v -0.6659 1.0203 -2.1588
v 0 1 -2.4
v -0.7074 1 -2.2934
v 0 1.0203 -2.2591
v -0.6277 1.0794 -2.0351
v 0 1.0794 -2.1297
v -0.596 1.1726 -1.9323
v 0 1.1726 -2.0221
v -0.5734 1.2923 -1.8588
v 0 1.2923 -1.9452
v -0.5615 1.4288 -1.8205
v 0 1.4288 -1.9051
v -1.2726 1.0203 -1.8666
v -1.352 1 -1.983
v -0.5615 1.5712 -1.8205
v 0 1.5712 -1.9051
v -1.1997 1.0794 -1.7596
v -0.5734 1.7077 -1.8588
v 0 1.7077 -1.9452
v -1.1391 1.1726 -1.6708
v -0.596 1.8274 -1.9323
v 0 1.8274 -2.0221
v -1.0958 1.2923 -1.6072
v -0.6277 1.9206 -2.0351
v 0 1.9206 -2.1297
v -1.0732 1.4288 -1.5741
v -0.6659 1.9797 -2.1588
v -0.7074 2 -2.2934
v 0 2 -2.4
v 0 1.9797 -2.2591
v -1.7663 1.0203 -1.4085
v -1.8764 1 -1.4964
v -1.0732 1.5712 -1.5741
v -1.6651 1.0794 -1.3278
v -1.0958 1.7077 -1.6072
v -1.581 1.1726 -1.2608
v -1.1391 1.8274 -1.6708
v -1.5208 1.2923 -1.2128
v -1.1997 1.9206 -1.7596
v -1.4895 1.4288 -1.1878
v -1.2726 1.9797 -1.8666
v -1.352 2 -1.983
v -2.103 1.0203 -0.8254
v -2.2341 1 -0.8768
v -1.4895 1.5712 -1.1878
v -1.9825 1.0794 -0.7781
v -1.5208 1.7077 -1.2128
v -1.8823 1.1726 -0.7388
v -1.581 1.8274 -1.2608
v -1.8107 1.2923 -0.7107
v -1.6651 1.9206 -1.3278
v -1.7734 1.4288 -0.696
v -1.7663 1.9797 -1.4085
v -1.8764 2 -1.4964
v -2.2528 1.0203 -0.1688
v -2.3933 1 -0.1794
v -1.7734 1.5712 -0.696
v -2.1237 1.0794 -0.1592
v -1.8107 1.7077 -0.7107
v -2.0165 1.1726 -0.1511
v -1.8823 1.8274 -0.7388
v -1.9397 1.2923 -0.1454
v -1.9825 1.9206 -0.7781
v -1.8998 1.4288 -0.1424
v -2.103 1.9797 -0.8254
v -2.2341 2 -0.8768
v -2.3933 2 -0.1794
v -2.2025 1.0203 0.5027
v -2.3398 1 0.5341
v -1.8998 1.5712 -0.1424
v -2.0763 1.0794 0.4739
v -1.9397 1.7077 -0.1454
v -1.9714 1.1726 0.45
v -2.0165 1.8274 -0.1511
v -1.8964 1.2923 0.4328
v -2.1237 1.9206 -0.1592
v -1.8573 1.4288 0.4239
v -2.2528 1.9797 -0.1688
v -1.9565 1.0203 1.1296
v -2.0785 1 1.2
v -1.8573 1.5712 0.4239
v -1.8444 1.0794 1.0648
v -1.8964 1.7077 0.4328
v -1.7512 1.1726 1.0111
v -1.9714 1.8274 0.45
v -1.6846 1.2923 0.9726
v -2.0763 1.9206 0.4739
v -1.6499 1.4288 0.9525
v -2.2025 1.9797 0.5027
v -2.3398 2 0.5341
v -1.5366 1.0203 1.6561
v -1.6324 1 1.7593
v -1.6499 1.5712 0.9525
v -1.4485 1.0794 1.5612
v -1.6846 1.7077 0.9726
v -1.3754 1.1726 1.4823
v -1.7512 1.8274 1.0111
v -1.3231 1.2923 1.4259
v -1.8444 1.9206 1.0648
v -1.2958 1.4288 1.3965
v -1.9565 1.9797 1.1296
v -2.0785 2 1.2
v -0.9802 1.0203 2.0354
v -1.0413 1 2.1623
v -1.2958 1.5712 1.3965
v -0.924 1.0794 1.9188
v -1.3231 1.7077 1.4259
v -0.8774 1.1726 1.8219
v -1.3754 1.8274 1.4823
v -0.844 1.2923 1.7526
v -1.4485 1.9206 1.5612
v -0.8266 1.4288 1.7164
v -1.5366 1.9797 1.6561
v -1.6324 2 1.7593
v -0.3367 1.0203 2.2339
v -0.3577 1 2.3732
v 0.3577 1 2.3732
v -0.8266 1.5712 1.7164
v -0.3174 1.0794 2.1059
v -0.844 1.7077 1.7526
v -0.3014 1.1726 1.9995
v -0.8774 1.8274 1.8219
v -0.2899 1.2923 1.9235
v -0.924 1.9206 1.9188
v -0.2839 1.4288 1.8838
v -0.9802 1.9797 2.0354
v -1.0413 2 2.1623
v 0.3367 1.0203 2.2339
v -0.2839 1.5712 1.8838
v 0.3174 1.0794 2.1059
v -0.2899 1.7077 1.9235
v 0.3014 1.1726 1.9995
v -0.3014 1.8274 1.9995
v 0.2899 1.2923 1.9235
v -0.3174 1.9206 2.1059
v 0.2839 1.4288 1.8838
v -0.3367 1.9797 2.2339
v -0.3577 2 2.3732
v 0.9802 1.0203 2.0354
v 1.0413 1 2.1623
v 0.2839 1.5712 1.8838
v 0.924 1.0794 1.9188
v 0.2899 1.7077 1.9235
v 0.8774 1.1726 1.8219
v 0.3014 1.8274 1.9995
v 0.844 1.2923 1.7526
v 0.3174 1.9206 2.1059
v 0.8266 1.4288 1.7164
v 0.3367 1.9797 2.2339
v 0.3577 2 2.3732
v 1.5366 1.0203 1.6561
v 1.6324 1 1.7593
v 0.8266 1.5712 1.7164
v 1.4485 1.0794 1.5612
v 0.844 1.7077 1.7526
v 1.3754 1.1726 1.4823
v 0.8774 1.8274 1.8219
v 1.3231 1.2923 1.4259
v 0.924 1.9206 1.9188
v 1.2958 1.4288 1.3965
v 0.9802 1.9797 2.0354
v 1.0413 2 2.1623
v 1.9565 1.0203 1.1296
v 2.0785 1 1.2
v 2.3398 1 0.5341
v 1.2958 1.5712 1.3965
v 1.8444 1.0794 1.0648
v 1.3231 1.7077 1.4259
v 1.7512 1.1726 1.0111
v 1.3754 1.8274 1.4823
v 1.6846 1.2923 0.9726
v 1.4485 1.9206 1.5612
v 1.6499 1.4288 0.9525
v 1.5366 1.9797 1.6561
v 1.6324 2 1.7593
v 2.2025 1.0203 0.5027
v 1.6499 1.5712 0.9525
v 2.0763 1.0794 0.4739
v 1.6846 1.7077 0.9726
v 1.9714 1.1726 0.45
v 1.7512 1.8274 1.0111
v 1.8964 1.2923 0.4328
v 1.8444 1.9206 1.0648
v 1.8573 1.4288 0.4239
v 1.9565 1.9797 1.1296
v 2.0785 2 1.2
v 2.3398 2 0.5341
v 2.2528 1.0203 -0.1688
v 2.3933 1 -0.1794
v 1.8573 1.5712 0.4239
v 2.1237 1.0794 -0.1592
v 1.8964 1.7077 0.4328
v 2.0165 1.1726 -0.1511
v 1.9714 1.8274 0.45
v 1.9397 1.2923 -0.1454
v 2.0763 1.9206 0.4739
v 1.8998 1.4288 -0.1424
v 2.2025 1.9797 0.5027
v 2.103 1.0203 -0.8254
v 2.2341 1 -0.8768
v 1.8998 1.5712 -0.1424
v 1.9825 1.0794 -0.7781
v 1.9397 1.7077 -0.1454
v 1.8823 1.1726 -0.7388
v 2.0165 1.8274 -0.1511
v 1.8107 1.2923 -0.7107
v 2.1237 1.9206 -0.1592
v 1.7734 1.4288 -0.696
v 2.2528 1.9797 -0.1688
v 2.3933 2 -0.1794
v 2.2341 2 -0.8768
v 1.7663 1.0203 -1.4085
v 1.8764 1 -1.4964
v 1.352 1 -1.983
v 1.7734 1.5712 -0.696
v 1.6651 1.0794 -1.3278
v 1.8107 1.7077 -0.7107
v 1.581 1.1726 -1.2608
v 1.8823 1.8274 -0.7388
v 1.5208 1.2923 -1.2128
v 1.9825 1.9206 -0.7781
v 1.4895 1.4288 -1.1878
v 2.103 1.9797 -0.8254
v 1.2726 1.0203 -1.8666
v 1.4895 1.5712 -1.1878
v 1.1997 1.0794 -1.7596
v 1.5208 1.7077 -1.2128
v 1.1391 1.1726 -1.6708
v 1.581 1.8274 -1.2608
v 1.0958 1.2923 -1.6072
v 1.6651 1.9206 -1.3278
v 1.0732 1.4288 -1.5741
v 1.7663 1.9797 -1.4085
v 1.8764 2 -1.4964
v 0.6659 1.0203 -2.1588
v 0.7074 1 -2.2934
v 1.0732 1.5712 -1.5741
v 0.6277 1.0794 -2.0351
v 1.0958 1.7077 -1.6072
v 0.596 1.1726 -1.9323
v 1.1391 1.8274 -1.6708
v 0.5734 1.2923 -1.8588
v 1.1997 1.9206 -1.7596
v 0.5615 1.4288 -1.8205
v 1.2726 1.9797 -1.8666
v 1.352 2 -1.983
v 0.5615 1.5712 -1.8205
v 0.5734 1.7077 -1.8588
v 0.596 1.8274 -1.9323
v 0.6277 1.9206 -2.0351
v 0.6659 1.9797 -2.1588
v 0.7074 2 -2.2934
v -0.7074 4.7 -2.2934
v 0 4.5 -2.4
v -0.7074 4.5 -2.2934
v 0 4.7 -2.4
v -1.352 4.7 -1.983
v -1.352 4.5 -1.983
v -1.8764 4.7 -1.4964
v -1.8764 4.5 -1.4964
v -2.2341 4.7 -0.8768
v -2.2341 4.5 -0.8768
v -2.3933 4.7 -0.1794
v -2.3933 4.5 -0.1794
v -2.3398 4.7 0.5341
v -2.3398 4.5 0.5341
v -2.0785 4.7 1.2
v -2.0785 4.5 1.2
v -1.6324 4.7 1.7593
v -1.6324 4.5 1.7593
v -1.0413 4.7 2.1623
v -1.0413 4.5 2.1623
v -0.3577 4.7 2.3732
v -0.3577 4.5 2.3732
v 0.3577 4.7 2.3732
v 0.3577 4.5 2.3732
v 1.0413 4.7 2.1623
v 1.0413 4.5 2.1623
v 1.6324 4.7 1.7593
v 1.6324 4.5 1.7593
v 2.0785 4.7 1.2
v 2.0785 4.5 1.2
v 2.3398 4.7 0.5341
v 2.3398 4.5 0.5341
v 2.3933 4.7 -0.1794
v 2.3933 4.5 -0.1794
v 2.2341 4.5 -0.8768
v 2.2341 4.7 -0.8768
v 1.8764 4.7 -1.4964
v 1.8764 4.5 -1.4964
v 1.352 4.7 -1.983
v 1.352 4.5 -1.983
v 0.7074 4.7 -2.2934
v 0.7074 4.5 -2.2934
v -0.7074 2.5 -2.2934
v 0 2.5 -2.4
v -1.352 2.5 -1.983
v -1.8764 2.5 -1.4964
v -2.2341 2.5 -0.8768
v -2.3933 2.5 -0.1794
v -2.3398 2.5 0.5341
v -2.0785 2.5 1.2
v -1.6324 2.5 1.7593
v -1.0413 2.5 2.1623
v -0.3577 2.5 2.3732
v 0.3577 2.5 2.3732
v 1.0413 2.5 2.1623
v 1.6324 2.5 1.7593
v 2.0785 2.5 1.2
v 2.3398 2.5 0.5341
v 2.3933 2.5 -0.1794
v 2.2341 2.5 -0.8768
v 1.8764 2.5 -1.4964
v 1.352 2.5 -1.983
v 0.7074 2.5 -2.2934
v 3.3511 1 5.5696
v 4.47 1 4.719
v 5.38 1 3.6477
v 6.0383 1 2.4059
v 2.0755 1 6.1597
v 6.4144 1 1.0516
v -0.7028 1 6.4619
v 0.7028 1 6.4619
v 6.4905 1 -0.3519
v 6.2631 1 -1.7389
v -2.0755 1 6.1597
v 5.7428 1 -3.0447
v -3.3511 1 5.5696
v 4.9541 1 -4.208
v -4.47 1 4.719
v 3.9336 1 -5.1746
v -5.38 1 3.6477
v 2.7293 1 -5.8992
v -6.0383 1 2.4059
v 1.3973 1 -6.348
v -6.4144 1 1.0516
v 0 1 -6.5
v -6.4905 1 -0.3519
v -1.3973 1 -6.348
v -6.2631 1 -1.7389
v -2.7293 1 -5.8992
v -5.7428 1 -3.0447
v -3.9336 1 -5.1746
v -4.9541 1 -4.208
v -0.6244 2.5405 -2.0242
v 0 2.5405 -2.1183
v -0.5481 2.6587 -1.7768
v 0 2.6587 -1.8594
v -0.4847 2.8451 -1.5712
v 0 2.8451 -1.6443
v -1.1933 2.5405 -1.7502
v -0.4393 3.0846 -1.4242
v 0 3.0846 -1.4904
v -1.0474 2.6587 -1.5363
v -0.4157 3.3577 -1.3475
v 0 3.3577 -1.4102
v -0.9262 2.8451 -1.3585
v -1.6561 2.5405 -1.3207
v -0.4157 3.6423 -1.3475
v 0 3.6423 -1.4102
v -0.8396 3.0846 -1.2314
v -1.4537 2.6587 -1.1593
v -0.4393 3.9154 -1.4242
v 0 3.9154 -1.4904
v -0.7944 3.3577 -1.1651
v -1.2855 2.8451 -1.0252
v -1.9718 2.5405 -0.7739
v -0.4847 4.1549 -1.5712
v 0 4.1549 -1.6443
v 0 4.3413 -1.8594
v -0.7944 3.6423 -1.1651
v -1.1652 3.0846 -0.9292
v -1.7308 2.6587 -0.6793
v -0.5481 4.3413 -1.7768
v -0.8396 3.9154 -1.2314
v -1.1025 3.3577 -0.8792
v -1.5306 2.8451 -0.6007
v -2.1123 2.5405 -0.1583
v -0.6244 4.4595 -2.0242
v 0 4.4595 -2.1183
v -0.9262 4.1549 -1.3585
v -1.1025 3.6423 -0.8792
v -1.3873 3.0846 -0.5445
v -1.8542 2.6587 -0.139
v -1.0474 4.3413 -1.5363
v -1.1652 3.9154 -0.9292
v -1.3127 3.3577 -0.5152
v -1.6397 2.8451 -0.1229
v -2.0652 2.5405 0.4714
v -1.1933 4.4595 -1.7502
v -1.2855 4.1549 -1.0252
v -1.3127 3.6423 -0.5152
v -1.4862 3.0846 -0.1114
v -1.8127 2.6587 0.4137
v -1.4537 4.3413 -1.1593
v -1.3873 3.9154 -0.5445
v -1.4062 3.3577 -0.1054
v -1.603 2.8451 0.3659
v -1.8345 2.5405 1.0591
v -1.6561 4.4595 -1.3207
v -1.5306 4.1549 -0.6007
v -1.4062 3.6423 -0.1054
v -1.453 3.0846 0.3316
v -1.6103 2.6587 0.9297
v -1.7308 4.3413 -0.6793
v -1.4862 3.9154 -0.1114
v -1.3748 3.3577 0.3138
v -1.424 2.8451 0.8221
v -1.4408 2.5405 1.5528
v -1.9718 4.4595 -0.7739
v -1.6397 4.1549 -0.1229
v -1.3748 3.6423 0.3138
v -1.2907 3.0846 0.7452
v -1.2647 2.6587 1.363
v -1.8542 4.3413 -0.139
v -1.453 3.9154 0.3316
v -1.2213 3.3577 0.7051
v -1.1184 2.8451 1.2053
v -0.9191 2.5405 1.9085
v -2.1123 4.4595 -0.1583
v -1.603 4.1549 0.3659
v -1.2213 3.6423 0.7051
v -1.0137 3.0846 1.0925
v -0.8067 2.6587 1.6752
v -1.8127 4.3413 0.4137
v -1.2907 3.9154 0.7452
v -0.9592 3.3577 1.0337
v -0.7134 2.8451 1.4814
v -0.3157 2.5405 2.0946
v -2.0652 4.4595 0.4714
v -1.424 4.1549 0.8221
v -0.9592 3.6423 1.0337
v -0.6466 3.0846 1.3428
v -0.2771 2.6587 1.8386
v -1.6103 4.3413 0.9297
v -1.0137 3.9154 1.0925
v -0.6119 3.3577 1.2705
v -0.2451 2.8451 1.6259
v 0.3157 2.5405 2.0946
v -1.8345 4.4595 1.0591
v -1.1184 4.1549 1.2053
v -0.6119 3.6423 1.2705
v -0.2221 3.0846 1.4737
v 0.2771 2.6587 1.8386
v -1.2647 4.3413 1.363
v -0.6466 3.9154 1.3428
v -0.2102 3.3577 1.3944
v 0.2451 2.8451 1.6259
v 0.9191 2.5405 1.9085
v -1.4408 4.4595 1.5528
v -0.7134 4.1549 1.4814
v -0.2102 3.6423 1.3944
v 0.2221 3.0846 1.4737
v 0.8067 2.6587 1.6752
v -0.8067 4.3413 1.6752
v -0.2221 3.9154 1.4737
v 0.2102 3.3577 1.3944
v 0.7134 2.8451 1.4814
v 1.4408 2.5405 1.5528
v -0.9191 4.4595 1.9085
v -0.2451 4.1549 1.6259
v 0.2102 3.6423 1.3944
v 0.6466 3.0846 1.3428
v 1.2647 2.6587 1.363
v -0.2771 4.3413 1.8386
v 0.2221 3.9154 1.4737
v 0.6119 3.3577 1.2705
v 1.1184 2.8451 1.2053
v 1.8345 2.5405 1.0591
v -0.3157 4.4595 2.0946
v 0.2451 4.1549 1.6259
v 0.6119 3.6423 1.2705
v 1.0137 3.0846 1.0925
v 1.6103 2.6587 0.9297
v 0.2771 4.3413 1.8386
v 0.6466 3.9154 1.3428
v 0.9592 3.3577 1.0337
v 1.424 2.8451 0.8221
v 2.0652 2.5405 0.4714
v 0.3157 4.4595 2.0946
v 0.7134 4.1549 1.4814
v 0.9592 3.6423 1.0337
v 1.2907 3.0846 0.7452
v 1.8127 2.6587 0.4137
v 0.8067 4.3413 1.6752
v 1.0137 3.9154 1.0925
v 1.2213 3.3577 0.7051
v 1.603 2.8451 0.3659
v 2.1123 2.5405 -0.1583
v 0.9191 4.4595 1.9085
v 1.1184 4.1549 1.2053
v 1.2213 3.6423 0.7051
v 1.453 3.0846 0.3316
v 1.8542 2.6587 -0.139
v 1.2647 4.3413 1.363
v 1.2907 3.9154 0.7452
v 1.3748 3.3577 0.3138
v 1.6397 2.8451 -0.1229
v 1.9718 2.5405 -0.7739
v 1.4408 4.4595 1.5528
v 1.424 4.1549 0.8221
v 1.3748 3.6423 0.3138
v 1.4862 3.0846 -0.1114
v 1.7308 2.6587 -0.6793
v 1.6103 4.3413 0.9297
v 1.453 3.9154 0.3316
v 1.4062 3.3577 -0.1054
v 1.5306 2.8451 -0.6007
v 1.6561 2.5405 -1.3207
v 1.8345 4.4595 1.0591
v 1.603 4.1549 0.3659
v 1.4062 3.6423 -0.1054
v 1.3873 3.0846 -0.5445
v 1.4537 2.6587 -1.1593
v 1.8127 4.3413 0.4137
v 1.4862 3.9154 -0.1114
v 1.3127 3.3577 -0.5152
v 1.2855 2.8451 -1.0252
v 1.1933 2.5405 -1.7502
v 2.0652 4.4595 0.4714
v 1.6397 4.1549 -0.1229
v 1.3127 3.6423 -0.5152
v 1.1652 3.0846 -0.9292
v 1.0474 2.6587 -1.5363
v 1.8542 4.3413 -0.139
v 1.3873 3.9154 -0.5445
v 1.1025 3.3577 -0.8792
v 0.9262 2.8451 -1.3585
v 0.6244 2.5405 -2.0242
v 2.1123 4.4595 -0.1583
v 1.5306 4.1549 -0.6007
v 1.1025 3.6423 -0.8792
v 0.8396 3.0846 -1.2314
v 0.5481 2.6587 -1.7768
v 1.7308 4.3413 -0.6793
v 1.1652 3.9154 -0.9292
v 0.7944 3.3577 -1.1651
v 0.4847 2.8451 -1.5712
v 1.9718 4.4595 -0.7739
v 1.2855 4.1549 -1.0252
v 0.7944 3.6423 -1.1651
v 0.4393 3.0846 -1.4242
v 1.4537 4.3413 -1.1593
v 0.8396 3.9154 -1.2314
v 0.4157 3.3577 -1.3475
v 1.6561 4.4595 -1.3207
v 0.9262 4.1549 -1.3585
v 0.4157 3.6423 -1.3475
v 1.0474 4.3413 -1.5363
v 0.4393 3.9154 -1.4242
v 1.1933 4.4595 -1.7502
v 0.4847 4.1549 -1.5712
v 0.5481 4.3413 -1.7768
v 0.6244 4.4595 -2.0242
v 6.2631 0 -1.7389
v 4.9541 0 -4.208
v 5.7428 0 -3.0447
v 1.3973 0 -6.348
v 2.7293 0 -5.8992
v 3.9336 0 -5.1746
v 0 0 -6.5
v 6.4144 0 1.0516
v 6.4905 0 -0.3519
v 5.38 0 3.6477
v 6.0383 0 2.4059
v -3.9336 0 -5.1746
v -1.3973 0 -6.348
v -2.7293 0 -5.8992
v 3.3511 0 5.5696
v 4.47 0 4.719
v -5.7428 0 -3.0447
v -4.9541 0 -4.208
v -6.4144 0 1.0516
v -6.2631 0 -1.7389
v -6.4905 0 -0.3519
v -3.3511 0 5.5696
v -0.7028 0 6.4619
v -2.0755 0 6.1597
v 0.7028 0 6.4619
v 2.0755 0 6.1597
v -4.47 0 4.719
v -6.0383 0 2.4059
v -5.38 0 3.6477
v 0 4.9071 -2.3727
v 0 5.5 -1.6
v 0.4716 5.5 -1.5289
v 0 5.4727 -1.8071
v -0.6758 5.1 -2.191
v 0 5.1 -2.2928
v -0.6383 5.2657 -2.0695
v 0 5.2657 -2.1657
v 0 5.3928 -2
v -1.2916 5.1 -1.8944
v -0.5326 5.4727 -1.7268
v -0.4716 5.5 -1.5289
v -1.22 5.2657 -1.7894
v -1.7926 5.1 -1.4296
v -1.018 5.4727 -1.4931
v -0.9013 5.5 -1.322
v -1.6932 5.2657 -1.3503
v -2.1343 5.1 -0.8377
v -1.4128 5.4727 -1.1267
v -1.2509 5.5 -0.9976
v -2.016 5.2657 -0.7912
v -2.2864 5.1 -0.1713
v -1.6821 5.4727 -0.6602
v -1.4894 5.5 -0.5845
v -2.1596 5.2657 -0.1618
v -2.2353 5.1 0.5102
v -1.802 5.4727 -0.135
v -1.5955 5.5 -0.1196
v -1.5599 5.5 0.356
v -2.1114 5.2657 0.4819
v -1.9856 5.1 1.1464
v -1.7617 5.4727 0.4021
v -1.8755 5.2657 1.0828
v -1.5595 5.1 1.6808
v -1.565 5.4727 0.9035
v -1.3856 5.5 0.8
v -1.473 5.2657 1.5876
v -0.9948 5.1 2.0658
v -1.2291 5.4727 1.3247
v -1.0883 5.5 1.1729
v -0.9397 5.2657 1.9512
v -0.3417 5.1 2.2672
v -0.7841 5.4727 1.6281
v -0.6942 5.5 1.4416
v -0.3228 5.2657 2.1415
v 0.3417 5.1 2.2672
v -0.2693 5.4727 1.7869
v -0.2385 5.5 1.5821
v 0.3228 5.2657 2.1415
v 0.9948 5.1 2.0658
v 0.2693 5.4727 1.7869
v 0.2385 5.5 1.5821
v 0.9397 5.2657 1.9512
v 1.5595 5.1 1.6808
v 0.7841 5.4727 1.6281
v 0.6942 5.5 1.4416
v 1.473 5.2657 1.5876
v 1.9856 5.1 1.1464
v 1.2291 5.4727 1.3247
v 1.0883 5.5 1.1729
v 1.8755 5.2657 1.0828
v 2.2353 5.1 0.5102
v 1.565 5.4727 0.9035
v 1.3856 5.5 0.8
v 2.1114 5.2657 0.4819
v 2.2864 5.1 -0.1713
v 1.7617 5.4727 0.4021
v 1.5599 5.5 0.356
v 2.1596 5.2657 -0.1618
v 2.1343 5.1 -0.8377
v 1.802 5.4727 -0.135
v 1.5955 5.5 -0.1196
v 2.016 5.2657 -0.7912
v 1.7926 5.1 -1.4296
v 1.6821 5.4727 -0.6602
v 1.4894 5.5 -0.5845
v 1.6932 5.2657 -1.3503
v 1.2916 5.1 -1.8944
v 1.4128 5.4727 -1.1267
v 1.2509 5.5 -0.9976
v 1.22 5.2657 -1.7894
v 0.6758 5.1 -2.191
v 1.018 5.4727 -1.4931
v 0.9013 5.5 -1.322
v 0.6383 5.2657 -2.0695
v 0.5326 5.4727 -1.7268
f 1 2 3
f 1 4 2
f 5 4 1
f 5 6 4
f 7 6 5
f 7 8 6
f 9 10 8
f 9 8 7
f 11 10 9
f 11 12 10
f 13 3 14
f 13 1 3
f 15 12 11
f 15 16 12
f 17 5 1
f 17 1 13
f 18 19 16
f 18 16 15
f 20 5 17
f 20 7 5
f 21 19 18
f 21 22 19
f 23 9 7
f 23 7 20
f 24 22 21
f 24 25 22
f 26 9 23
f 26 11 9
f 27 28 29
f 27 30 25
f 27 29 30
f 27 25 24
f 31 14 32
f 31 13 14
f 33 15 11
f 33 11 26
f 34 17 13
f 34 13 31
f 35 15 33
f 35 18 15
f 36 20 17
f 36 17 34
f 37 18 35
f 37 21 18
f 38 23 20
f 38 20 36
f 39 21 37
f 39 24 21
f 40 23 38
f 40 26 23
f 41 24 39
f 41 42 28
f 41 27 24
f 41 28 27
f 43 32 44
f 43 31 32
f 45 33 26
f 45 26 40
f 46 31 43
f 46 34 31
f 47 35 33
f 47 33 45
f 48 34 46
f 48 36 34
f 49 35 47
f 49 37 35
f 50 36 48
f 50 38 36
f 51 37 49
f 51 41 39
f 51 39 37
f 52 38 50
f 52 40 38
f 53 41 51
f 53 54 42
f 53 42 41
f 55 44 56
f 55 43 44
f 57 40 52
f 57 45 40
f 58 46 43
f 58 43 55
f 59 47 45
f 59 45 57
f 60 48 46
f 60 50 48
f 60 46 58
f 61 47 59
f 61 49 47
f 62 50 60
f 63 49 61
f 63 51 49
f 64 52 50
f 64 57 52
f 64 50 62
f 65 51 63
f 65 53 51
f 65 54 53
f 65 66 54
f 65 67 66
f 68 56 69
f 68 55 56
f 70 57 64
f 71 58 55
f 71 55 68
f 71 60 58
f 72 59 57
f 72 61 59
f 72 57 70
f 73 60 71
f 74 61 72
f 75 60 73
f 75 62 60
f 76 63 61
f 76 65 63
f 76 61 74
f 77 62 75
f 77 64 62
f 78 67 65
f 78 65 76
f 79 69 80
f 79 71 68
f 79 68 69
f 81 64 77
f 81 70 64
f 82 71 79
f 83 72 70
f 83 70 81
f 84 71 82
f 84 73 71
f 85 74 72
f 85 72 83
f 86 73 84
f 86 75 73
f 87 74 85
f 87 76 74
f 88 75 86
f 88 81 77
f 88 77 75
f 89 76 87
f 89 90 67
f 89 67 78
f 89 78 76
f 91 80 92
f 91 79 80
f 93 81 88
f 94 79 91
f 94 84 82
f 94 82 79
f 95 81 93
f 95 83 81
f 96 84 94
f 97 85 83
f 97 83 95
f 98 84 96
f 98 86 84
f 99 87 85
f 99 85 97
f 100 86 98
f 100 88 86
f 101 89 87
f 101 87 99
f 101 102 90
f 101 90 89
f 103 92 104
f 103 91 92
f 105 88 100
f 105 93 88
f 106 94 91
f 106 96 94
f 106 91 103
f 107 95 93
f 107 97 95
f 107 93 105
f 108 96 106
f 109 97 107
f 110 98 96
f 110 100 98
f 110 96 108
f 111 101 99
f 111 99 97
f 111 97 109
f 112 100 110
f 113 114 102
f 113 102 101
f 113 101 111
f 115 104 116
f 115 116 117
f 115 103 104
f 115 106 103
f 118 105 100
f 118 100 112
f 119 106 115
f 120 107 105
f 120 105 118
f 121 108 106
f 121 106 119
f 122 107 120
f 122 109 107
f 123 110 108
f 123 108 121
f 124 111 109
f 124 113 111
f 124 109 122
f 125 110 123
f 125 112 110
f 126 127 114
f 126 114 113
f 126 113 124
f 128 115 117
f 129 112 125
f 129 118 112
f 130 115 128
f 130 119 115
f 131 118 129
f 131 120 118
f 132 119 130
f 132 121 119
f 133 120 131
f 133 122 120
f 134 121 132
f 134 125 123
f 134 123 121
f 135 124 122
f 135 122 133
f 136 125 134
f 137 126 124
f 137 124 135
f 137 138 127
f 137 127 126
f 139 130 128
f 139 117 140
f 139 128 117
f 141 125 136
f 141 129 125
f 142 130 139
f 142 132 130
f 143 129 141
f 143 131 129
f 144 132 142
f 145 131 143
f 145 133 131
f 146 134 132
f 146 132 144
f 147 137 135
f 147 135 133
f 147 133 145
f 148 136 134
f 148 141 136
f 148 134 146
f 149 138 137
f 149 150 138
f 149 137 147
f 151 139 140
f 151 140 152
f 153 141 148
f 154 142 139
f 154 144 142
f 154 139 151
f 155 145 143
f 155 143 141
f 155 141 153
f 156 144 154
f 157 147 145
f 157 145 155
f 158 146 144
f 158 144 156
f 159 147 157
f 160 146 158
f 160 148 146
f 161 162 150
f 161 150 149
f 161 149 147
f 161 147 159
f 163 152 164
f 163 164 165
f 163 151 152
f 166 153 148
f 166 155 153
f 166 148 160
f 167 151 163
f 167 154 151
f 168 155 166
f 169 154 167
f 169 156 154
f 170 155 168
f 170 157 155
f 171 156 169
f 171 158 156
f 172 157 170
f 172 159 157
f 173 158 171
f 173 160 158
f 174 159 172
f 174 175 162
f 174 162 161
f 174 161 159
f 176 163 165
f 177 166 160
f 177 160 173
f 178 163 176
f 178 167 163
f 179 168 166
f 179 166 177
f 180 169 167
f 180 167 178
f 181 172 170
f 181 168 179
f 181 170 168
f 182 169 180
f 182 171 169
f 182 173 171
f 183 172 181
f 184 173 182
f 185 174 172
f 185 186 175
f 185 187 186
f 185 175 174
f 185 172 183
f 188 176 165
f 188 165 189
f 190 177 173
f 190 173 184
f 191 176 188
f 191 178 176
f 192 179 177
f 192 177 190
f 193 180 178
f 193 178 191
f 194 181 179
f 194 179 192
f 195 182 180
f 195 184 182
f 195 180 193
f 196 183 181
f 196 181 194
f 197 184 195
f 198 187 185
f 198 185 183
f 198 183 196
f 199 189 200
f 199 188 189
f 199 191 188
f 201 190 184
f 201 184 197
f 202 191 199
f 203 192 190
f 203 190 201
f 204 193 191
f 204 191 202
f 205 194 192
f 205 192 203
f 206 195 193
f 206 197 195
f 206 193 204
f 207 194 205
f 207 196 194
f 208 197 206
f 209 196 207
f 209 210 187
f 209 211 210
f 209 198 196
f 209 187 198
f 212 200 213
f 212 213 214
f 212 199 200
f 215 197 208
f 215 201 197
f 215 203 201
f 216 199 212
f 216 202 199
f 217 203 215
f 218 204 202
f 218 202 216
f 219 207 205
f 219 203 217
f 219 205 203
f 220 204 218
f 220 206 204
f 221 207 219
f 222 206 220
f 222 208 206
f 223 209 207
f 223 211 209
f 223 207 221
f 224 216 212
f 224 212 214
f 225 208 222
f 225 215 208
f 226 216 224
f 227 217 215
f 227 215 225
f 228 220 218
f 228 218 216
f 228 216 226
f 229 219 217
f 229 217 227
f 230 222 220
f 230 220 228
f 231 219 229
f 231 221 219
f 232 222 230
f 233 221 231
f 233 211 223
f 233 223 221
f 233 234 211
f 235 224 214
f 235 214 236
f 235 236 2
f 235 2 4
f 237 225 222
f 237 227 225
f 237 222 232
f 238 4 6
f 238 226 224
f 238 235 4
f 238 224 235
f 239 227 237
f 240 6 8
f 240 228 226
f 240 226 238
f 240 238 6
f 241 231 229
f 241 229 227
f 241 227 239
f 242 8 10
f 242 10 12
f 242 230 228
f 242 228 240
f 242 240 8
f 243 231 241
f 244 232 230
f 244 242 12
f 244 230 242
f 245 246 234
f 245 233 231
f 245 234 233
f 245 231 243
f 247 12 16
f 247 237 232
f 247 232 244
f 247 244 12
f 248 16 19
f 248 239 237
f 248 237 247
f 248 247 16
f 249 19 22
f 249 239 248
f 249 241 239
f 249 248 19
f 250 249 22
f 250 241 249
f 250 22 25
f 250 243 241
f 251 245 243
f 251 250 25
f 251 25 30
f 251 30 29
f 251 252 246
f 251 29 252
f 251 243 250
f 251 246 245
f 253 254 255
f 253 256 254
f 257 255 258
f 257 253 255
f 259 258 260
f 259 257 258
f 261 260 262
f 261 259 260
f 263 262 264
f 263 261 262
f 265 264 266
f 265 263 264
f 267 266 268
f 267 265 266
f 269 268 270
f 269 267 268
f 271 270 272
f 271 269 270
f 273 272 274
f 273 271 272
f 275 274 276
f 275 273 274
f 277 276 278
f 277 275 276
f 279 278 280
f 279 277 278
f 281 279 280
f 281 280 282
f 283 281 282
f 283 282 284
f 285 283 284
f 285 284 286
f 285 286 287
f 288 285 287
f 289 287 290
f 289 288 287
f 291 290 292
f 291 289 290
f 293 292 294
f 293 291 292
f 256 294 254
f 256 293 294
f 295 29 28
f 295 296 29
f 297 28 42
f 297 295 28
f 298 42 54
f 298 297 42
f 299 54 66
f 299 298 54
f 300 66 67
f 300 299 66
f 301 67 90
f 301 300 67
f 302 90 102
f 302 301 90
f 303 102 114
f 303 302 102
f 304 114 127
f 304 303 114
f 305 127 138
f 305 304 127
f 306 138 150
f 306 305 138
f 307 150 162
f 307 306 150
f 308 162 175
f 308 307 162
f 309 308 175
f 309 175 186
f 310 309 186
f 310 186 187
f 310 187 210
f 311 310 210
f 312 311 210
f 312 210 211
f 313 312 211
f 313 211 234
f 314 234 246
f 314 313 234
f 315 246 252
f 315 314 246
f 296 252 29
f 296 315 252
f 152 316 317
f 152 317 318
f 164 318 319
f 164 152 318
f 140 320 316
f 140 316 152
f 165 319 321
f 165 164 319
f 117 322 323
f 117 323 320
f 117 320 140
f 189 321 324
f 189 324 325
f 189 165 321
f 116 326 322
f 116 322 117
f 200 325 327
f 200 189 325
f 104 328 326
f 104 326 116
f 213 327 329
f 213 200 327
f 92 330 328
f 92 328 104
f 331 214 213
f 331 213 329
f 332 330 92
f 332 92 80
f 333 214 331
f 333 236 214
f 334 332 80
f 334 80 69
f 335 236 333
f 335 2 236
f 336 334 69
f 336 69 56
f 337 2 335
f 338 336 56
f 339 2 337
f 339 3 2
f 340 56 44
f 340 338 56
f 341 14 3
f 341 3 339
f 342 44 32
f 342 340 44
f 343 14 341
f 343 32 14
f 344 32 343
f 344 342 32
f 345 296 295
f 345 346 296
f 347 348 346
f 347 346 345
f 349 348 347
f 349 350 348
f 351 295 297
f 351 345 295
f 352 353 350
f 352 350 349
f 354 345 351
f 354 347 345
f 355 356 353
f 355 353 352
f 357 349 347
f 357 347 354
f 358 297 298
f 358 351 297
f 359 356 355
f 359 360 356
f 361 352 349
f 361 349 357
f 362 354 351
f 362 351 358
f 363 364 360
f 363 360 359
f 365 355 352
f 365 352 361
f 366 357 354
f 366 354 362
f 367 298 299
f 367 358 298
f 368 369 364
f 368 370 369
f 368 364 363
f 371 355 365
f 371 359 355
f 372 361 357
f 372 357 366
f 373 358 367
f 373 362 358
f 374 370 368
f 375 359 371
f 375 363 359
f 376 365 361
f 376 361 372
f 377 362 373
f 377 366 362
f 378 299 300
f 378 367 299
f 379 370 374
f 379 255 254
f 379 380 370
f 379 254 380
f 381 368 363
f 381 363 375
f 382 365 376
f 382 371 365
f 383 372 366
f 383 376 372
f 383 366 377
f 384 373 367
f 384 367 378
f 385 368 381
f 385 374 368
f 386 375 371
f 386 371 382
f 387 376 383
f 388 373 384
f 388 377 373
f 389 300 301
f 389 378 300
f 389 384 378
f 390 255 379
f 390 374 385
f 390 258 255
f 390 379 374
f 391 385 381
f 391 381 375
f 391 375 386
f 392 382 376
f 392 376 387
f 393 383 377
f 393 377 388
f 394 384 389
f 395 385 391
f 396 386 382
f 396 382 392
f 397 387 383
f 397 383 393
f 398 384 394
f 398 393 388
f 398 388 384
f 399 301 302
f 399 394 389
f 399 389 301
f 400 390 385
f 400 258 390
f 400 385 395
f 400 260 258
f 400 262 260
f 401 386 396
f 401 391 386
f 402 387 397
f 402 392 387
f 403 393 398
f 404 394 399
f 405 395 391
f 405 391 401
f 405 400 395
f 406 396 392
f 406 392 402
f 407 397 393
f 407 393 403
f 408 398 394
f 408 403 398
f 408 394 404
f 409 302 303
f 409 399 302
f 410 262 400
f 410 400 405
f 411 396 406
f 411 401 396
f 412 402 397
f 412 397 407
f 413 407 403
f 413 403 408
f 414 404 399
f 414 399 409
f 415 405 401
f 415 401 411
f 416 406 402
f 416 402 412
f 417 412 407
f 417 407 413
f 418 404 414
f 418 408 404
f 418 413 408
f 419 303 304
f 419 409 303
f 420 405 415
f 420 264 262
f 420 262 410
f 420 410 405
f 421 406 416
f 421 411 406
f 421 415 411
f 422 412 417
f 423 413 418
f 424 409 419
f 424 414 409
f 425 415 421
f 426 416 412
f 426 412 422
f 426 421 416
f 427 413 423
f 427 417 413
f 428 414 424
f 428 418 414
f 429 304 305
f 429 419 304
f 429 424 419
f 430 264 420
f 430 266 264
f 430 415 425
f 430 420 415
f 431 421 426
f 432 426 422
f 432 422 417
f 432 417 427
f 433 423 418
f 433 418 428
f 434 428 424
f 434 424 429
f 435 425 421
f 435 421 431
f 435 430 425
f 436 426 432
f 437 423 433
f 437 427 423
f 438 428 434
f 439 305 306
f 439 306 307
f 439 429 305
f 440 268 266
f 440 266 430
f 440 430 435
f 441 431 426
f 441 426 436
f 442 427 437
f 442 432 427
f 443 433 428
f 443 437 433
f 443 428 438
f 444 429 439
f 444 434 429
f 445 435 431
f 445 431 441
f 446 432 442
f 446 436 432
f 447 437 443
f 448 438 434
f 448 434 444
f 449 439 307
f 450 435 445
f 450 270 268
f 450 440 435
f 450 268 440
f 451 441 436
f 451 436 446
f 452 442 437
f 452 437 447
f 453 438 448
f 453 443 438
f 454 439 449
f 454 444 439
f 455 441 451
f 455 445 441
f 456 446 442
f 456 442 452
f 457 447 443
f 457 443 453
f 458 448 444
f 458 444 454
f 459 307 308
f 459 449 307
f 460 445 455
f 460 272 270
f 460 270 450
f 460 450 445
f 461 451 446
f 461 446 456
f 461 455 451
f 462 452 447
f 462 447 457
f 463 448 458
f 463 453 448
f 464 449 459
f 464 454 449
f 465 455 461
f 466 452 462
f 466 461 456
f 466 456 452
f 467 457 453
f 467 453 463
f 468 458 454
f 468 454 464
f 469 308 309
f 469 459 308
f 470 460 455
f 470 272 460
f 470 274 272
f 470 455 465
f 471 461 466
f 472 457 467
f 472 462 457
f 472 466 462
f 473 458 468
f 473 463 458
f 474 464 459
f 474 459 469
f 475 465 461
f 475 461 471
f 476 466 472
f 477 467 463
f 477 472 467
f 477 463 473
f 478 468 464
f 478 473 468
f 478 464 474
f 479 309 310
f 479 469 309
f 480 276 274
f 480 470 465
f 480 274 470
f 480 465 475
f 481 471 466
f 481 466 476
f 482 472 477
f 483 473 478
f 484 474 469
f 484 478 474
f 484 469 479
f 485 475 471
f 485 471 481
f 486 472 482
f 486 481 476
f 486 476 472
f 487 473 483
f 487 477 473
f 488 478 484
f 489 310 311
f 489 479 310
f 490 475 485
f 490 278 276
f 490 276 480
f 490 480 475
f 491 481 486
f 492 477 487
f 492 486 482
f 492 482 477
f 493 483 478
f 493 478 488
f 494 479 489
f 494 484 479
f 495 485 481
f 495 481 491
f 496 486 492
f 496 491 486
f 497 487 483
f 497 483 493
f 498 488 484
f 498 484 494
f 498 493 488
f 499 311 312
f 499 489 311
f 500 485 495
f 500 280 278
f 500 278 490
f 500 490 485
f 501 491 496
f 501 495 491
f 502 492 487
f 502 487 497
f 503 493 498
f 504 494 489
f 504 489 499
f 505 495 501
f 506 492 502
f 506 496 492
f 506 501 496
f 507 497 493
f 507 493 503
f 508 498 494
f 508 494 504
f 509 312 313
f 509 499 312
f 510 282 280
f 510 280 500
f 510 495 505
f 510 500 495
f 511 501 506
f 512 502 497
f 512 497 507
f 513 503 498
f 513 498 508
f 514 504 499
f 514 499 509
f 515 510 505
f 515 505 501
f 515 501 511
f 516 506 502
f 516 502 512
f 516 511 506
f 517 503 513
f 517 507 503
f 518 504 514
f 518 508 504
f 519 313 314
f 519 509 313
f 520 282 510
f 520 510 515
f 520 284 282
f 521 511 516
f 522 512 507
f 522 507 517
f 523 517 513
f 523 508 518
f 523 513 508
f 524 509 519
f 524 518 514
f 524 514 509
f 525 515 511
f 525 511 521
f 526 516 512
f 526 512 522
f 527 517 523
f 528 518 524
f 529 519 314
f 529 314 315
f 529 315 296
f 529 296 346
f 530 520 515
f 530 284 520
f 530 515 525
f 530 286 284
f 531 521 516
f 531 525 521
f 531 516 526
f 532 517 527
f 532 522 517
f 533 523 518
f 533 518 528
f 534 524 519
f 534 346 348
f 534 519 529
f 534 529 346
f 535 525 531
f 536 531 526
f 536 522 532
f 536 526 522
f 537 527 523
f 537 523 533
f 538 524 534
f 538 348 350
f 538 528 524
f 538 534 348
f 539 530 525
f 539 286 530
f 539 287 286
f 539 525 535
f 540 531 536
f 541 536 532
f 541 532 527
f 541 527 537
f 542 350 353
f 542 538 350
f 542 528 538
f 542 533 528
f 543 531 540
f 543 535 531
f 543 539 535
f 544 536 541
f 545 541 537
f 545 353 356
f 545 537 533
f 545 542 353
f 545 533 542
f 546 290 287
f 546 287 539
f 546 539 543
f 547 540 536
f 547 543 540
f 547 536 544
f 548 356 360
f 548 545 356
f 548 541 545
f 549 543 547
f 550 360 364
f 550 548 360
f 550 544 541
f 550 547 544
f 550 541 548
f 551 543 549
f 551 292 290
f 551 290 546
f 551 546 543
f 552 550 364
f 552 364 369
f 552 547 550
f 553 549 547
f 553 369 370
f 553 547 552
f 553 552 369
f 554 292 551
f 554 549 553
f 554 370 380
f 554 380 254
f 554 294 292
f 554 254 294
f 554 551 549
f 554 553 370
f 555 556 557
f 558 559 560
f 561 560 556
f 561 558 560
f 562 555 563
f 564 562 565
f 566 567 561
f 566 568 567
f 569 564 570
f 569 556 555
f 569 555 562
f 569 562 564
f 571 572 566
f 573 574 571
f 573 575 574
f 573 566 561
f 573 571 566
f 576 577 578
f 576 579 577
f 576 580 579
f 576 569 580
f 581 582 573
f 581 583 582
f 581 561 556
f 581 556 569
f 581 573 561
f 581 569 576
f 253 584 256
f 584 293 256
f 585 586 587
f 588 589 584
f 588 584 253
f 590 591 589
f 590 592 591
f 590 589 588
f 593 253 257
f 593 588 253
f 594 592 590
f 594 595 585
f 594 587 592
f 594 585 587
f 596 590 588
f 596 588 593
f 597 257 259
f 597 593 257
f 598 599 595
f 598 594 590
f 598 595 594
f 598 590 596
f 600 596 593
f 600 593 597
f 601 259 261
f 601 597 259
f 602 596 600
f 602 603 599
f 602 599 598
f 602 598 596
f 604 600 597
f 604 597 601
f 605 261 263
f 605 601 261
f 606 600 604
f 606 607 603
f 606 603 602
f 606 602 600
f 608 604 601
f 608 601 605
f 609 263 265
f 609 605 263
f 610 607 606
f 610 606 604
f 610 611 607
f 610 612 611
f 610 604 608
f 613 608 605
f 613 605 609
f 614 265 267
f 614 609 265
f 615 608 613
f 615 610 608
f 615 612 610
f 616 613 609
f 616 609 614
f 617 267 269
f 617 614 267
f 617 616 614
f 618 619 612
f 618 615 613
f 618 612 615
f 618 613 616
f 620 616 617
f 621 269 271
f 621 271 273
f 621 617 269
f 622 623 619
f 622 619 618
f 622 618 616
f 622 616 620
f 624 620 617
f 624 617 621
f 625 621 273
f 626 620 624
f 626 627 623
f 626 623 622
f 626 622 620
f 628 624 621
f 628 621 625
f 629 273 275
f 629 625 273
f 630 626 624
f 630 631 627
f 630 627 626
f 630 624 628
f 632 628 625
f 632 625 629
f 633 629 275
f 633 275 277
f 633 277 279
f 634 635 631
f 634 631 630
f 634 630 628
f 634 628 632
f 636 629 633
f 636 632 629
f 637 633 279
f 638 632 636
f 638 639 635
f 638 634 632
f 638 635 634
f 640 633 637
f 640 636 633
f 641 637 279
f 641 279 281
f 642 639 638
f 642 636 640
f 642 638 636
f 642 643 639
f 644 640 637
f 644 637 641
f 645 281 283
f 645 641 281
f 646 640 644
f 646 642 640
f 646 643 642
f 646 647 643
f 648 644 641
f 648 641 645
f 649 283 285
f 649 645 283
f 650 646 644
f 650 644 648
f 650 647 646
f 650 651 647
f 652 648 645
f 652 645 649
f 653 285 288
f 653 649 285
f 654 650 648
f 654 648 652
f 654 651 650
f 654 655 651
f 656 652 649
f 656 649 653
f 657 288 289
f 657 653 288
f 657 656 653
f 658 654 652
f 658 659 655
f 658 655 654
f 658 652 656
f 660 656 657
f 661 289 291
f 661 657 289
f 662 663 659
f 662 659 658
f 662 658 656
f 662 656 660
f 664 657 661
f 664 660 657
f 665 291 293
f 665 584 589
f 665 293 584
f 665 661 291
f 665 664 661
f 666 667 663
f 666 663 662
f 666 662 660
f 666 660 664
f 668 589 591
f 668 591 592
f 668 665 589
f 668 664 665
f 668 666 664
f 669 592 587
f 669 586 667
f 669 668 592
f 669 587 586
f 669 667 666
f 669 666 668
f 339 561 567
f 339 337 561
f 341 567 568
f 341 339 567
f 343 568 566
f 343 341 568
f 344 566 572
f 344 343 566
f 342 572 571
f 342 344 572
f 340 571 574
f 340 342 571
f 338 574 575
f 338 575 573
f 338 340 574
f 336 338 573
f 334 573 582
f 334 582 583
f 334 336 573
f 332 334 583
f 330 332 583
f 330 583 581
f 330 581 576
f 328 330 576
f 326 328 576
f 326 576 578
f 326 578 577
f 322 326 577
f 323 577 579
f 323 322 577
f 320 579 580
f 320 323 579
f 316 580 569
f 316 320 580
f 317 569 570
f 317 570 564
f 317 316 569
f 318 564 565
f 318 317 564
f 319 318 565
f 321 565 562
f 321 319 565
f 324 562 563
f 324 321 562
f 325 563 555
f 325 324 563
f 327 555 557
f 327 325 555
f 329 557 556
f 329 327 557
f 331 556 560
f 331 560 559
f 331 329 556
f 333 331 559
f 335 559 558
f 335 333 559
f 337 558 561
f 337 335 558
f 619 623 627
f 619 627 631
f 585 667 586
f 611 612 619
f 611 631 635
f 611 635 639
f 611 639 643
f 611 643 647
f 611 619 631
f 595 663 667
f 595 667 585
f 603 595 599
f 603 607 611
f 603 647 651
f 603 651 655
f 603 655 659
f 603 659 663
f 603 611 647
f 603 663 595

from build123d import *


with BuildPart() as part:
    # Sketch1 → Revolve1 (revolve)
    with BuildSketch(Plane.XY, mode=Mode.PRIVATE) as revolve1_sk:
        with BuildLine():
            Line((0, 1), (0, 0))
            Line((0, 0), (6.5, 0))
            Line((6.5, 0), (6.5, 1))
            Line((6.5, 1), (2.4, 1))
            ThreePointArc((2.4, 1), (1.9, 1.5), (2.4, 2))
            Line((2.4, 2), (2.4, 2.5))
            ThreePointArc((2.4, 2.5), (1.4, 3.5), (2.4, 4.5))
            Line((2.4, 4.5), (2.4, 4.7))
            ThreePointArc((2.4, 4.7), (2.165685425, 5.265685425), (1.6, 5.5))
            Line((1.6, 5.5), (0, 5.5))
            Line((0, 5.5), (0, 1))
        make_face()
    revolve(revolve1_sk.sketch.rotate(Axis((0, 0, 0), (0, 1, 0)), 90), axis=Axis((0, 0, 0), (0, 1, 0)))


solid = part.part
